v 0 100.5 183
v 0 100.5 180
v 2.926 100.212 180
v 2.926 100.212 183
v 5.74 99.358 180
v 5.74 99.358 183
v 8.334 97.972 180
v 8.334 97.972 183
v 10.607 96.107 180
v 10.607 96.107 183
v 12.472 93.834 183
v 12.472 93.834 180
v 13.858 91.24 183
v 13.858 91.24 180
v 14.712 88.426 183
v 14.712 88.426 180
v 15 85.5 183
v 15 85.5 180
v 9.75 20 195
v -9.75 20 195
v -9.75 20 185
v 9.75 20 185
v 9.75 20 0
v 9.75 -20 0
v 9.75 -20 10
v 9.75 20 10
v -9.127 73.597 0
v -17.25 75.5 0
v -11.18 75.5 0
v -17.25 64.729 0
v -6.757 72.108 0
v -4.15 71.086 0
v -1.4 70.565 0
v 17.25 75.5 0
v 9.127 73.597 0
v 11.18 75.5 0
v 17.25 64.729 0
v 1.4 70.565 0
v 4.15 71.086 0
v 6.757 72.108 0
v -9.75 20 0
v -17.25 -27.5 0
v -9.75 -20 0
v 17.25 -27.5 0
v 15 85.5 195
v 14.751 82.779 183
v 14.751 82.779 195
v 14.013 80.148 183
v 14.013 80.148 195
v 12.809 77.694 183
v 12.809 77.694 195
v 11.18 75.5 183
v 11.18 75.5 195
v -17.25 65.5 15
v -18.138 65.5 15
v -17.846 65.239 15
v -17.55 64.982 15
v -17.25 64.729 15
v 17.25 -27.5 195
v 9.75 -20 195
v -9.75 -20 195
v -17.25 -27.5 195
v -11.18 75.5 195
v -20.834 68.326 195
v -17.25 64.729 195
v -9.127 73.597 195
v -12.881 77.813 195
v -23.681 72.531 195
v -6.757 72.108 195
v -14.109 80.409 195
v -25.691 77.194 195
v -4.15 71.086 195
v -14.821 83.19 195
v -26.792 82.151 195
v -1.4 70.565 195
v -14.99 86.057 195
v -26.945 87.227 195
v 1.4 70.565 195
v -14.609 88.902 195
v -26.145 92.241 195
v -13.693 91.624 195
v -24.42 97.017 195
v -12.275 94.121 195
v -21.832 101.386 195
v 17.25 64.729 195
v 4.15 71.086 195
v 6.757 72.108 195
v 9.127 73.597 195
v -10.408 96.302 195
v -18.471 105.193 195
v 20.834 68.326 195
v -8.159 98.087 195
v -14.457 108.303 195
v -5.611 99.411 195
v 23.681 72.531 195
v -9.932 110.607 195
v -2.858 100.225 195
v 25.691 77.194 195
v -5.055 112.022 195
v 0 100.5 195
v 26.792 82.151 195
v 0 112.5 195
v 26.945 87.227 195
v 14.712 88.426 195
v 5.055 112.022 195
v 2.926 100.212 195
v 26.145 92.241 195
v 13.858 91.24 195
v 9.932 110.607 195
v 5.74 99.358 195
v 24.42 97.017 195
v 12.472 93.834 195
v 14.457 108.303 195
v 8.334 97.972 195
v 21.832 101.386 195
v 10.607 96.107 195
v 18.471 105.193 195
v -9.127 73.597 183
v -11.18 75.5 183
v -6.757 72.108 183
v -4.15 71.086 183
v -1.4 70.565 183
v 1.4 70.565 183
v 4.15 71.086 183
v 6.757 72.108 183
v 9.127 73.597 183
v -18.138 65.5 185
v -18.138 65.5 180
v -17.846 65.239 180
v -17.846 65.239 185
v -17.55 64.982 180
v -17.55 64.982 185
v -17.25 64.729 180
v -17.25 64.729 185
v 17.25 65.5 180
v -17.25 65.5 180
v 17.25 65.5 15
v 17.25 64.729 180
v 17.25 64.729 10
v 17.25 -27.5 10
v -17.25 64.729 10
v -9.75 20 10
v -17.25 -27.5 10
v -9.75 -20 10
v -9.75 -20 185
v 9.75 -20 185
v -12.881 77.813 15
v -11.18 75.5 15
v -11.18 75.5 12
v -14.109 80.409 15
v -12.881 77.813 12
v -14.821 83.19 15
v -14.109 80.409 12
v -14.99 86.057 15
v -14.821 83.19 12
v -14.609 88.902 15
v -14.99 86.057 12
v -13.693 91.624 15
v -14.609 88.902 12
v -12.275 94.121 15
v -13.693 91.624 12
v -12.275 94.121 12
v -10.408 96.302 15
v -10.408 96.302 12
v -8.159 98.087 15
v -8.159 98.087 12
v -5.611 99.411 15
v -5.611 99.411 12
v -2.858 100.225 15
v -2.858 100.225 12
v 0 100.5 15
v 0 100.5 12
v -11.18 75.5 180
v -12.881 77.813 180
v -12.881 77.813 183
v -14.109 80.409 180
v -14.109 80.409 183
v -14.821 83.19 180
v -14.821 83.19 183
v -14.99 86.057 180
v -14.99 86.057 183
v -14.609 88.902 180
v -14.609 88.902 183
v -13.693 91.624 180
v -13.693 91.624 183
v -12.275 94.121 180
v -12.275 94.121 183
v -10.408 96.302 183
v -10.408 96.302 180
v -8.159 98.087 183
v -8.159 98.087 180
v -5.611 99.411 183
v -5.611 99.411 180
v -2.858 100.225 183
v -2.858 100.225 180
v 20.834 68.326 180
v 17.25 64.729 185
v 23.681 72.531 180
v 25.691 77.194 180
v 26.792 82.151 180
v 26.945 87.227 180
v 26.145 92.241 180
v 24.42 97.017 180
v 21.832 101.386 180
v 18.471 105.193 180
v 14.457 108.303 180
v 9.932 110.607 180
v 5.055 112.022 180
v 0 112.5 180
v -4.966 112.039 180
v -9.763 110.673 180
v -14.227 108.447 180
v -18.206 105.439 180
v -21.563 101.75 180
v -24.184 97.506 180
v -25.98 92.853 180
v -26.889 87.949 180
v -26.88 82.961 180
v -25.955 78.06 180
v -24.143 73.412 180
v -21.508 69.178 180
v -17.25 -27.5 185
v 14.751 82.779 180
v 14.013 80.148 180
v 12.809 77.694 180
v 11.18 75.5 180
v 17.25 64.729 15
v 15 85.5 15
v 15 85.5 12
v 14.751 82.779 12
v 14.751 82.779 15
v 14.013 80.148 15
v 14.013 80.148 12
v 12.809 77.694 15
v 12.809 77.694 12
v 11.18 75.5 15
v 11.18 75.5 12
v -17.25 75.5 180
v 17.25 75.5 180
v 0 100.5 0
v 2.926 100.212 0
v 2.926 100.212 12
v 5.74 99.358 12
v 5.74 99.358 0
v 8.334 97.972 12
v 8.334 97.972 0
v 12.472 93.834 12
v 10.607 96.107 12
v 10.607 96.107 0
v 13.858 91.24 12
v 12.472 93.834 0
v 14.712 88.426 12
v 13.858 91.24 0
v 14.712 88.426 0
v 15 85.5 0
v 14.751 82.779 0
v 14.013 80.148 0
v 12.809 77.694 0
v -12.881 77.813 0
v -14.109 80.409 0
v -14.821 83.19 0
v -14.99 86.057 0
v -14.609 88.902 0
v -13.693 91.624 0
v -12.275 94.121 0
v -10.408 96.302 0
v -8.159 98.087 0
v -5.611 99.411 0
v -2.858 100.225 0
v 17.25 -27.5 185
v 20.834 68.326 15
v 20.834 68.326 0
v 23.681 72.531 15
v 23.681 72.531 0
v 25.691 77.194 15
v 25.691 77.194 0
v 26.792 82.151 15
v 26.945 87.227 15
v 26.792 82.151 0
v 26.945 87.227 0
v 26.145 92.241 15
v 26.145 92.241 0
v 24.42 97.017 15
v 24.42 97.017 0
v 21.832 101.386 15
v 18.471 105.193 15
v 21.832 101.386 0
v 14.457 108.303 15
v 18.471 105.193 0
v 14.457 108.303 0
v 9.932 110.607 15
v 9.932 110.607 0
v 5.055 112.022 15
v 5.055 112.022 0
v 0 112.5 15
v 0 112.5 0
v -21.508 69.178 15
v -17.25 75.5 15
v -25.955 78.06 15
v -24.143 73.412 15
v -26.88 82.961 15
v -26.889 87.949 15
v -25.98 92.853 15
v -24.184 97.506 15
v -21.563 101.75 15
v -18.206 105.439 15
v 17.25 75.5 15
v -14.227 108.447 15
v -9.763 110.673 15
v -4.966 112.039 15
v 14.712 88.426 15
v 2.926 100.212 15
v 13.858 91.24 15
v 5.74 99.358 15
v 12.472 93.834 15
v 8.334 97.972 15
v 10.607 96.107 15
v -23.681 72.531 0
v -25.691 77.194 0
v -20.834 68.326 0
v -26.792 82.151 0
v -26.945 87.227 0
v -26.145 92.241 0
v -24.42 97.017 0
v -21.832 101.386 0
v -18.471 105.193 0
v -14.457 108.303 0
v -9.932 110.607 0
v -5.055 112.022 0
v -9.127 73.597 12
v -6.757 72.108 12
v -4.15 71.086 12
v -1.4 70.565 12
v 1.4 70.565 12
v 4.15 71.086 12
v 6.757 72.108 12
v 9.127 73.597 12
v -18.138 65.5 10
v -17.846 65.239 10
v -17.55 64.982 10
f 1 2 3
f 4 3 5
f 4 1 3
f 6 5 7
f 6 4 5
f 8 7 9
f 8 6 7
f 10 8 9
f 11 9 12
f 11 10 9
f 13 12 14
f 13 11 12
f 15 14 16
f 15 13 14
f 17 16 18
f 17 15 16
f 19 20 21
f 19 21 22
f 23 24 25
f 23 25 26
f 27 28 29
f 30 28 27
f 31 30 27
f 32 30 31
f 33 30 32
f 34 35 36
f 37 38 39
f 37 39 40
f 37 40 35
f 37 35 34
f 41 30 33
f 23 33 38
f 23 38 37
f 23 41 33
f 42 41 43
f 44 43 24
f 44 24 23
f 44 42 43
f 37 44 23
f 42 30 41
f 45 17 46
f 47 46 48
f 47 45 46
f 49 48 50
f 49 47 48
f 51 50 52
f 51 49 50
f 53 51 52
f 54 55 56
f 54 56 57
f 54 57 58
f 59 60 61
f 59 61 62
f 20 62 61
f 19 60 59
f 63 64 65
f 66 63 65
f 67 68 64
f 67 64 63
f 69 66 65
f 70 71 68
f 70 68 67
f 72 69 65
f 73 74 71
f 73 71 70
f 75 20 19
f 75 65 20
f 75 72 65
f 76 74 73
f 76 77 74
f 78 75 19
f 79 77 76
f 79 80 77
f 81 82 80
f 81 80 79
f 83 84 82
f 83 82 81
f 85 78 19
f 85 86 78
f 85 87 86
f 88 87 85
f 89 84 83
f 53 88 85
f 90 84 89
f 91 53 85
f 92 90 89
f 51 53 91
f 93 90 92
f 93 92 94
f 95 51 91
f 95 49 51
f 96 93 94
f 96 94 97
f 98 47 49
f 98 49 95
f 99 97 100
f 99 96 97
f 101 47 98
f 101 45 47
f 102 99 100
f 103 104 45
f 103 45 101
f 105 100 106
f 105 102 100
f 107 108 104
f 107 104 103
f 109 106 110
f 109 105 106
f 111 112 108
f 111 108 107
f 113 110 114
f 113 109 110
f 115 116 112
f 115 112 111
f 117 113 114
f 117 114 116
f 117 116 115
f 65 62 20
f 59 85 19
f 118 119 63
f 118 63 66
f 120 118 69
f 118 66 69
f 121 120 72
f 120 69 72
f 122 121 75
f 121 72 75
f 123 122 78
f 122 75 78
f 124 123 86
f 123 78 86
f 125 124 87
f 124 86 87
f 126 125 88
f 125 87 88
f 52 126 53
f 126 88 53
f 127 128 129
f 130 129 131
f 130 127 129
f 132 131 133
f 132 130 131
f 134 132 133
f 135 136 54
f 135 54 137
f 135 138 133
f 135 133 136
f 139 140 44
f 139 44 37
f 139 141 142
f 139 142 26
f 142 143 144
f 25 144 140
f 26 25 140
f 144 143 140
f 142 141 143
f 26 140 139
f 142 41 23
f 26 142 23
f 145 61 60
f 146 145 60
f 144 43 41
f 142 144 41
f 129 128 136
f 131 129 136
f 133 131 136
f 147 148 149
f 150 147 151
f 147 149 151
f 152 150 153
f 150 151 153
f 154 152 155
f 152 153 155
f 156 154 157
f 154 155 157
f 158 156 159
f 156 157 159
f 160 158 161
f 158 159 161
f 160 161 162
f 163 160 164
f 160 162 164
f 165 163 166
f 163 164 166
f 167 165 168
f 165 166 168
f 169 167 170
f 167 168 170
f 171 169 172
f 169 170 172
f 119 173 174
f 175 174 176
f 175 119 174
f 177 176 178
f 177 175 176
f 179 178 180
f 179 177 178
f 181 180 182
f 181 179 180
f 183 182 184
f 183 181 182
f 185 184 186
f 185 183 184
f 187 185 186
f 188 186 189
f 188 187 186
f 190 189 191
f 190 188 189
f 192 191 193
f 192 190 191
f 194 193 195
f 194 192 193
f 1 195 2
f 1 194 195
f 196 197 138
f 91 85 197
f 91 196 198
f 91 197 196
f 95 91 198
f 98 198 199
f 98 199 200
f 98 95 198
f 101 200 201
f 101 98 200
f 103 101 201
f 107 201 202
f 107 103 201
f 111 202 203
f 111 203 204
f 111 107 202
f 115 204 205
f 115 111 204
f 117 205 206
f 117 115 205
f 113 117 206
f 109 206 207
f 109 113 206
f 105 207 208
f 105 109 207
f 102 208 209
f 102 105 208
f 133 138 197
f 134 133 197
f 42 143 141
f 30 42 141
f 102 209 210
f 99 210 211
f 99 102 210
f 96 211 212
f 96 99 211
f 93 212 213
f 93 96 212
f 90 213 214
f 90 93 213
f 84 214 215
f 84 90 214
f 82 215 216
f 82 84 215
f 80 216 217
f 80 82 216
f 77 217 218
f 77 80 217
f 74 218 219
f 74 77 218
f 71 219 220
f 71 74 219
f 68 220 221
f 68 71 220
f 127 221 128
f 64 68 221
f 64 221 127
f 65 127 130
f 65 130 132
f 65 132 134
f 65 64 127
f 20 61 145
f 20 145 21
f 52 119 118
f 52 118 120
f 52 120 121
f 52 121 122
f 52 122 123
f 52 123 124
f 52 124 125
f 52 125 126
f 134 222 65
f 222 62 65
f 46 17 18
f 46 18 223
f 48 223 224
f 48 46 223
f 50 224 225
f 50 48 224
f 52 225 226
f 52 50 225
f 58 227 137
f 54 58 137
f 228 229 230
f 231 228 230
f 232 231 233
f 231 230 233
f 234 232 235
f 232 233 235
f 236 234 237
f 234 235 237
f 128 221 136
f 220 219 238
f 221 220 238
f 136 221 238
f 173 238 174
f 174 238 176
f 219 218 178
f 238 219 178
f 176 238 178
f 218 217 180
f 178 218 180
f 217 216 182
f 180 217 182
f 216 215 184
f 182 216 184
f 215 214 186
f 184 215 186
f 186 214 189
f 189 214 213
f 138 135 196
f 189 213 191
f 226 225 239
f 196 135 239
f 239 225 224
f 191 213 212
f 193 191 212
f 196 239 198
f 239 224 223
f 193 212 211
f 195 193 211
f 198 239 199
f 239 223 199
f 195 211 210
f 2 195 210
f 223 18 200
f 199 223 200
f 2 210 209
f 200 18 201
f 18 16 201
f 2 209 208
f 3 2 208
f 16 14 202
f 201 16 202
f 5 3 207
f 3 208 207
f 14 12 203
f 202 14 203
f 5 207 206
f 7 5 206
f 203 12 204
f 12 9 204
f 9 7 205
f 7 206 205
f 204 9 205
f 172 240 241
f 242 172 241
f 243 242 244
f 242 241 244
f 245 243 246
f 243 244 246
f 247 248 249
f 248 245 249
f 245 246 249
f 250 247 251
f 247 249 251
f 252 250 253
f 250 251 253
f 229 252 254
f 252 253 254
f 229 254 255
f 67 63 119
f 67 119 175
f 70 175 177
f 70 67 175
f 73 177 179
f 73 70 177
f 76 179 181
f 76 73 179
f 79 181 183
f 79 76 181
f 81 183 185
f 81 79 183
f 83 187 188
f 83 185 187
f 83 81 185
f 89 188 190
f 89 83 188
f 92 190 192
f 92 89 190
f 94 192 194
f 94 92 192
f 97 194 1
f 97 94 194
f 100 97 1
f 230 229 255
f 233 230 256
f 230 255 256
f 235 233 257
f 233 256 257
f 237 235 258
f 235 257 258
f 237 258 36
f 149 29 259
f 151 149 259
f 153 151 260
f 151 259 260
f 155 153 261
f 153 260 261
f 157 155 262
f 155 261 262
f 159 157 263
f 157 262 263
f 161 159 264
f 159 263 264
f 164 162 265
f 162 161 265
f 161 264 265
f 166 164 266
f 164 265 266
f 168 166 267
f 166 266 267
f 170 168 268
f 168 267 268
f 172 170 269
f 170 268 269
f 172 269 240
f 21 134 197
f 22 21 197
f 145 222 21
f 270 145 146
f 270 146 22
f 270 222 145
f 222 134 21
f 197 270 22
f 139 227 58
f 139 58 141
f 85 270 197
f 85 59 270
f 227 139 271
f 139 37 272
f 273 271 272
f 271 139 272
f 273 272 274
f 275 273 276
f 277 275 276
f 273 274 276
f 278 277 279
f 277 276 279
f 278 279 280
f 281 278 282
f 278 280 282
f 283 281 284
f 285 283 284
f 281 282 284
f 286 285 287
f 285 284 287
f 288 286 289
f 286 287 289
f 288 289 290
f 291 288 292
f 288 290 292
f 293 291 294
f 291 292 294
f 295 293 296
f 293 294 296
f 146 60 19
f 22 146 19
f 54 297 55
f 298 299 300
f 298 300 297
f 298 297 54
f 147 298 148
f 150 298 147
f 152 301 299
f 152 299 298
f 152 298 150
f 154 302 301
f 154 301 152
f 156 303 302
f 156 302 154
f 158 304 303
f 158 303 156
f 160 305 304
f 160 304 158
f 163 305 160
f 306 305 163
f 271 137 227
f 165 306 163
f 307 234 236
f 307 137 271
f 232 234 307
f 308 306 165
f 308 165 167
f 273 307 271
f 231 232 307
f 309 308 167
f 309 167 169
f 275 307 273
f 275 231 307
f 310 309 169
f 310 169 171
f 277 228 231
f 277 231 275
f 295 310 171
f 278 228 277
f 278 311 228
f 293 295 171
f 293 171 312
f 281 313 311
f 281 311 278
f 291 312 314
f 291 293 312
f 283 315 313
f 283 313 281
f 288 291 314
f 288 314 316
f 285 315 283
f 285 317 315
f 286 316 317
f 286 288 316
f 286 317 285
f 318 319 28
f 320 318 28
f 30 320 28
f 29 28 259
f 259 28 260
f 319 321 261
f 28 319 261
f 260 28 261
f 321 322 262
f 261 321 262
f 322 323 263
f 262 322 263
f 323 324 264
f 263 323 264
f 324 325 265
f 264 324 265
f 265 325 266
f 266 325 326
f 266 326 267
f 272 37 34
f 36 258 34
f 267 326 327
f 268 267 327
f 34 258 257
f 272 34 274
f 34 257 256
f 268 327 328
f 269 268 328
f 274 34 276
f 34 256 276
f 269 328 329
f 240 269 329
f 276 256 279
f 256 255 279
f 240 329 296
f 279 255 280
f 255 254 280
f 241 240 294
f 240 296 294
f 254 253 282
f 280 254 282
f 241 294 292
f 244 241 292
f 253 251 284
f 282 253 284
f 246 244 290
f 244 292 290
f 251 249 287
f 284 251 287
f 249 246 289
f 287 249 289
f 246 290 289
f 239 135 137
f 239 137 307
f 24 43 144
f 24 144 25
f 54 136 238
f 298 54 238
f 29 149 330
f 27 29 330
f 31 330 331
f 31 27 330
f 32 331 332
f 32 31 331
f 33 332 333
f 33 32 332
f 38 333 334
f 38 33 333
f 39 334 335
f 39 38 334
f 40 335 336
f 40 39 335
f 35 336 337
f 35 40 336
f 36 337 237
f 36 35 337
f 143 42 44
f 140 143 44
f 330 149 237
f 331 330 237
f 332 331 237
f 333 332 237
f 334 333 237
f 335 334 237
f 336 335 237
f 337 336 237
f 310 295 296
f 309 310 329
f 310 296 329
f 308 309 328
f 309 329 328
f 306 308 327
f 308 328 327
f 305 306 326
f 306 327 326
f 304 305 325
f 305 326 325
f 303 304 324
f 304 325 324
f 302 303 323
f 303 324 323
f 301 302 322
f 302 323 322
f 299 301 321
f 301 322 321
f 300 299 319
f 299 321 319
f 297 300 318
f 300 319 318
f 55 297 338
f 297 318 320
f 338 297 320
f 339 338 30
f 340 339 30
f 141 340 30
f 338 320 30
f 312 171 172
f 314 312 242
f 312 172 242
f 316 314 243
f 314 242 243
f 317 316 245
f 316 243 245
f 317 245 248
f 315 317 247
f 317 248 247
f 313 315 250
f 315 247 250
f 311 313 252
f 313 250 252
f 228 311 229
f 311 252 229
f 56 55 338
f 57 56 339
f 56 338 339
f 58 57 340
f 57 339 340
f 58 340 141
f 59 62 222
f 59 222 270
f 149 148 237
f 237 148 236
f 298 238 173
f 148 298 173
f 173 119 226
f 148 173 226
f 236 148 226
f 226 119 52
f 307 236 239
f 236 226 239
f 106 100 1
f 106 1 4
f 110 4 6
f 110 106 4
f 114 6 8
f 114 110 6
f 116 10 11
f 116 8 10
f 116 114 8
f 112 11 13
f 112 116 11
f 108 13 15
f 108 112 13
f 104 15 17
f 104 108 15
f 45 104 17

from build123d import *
from build123d.topology import SkipClean

# Parameters (mm, degrees)
ESQUISSE1_W             = 34.5
ESQUISSE1_H             = 55
ESQUISSE1_W_2           = 19.5
ESQUISSE1_H_2           = 40
BOSS_EXTRU_1_DEPTH      = 10
ESQUISSE6_W             = 34.5
ESQUISSE6_H             = 10
BOSS_EXTRU_2_DEPTH      = 48
ESQUISSE7_W             = 34.5
ESQUISSE7_H             = 10
BOSS_EXTRU_3_DEPTH      = 87.5
BOSS_EXTRU_4_DEPTH      = 15
ESQUISSE9_R             = 15
ENL_V_MAT_EXTRU_1_DEPTH = 12
BOSS_EXTRU_5_REACH      = 231.433
BOSS_EXTRU_5_END_RADIUS = 27
ESQUISSE10_W            = 5
ESQUISSE10_H            = 0.771073636


with BuildPart() as part:
    # Esquisse1 → Boss.-Extru.1 (new body)
    with BuildSketch(Plane.XY):
        Rectangle(ESQUISSE1_W, ESQUISSE1_H)
        Rectangle(ESQUISSE1_W_2, ESQUISSE1_H_2, mode=Mode.SUBTRACT)
    boss_extru_1 = extrude(amount=BOSS_EXTRU_1_DEPTH)

    # Esquisse6 → Boss.-Extru.2 (add)
    with BuildSketch(Plane(origin=(0, 27.5, 0), x_dir=(1, 0, 0), z_dir=(0, 1, 0))):
        with Locations((0, -5)):
            Rectangle(ESQUISSE6_W, ESQUISSE6_H)
    boss_extru_2 = extrude(amount=BOSS_EXTRU_2_DEPTH)

    # Esquisse7 → Boss.-Extru.3 (add)
    with BuildSketch(Plane.XY.offset(10)):
        with Locations((0, 70.5)):
            Rectangle(ESQUISSE7_W, ESQUISSE7_H)
    boss_extru_3 = extrude(amount=BOSS_EXTRU_3_DEPTH)

    # Symétrie1: Boss.-Extru.1, Boss.-Extru.2, Boss.-Extru.3 across plane
    add(boss_extru_1.mirror(Plane(origin=(0, 0, 97.5), x_dir=(1, 0, 0), z_dir=(0, 0, -1))))
    add(boss_extru_2.mirror(Plane(origin=(0, 0, 97.5), x_dir=(1, 0, 0), z_dir=(0, 0, -1))))
    add(boss_extru_3.mirror(Plane(origin=(0, 0, 97.5), x_dir=(1, 0, 0), z_dir=(0, 0, -1))))

    # Esquisse8 → Boss.-Extru.4 (add)
    with BuildSketch(Plane.XY.offset(195)):
        with BuildLine():
            Line((11.180339887, 75.5), (17.25, 75.5))
            Line((17.25, 75.5), (17.25, 64.728926364))
            ThreePointArc((17.25, 64.728926364), (25.395068302, 94.670087563), (0, 112.5))
            Line((0, 112.5), (0, 100.5))
            ThreePointArc((0, 100.5), (10.606601718, 96.106601718), (15, 85.5))
            ThreePointArc((15, 85.5), (14.012585384, 80.147668653), (11.180339887, 75.5))
        make_face()
        with BuildLine():
            Line((0, 100.5), (0, 112.5))
            ThreePointArc((0, 112.5), (-25.395068302, 94.670087563), (-17.25, 64.728926364))
            Line((-17.25, 64.728926364), (-17.25, 75.5))
            Line((-17.25, 75.5), (-11.180339887, 75.5))
            ThreePointArc((-11.180339887, 75.5), (-13.693063938, 91.623724357), (0, 100.5))
        make_face()
    boss_extru_4 = extrude(amount=-BOSS_EXTRU_4_DEPTH)

    # Esquisse9 → Enlèv. mat.-Extru.1 (cut)
    with SkipClean():  # the faces are left unmerged after this step: merging them gives an invalid solid
        with BuildSketch(Plane.XY.offset(195)):
            with Locations((0, 85.5)):
                Circle(ESQUISSE9_R)
        enl_v_mat_extru_1 = extrude(amount=-ENL_V_MAT_EXTRU_1_DEPTH, mode=Mode.SUBTRACT)

    # Boss.-Extru.5: up to this cylinder (the profile starts inside it)
    with SkipClean():  # the faces are left unmerged after this step: merging them gives an invalid solid
        boss_extru_5_end = Plane(origin=(0, 85.5, 182.5), z_dir=(0, 0, 1)) * Cylinder(BOSS_EXTRU_5_END_RADIUS, 517.866, mode=Mode.PRIVATE)
        # Esquisse10 → Boss.-Extru.5 (add, up to the surface)
        with BuildSketch(Plane.ZY.offset(-17.25), mode=Mode.PRIVATE) as boss_extru_5_sk1:
            with Locations((182.5, 65.114463182)):
                Rectangle(ESQUISSE10_W, ESQUISSE10_H)
        boss_extru_5_tool1 = extrude(boss_extru_5_sk1.sketch, amount=BOSS_EXTRU_5_REACH, mode=Mode.PRIVATE) & boss_extru_5_end
        boss_extru_5 = boss_extru_5_tool1.solids().sort_by_distance((17.25, 65.114463, 182.5))[0]
        add(boss_extru_5)

    # Symétrie2: Boss.-Extru.4, Enlèv. mat.-Extru.1, Boss.-Extru.5 across plane
    with SkipClean():  # the faces are left unmerged after this step: merging them gives an invalid solid
        add(boss_extru_4.mirror(Plane(origin=(0, 0, 97.5), x_dir=(1, 0, 0), z_dir=(0, 0, -1))))
        add(enl_v_mat_extru_1.mirror(Plane(origin=(0, 0, 97.5), x_dir=(1, 0, 0), z_dir=(0, 0, -1))), mode=Mode.SUBTRACT)
        add(boss_extru_5.mirror(Plane(origin=(0, 0, 97.5), x_dir=(1, 0, 0), z_dir=(0, 0, -1))))


solid = part.part
